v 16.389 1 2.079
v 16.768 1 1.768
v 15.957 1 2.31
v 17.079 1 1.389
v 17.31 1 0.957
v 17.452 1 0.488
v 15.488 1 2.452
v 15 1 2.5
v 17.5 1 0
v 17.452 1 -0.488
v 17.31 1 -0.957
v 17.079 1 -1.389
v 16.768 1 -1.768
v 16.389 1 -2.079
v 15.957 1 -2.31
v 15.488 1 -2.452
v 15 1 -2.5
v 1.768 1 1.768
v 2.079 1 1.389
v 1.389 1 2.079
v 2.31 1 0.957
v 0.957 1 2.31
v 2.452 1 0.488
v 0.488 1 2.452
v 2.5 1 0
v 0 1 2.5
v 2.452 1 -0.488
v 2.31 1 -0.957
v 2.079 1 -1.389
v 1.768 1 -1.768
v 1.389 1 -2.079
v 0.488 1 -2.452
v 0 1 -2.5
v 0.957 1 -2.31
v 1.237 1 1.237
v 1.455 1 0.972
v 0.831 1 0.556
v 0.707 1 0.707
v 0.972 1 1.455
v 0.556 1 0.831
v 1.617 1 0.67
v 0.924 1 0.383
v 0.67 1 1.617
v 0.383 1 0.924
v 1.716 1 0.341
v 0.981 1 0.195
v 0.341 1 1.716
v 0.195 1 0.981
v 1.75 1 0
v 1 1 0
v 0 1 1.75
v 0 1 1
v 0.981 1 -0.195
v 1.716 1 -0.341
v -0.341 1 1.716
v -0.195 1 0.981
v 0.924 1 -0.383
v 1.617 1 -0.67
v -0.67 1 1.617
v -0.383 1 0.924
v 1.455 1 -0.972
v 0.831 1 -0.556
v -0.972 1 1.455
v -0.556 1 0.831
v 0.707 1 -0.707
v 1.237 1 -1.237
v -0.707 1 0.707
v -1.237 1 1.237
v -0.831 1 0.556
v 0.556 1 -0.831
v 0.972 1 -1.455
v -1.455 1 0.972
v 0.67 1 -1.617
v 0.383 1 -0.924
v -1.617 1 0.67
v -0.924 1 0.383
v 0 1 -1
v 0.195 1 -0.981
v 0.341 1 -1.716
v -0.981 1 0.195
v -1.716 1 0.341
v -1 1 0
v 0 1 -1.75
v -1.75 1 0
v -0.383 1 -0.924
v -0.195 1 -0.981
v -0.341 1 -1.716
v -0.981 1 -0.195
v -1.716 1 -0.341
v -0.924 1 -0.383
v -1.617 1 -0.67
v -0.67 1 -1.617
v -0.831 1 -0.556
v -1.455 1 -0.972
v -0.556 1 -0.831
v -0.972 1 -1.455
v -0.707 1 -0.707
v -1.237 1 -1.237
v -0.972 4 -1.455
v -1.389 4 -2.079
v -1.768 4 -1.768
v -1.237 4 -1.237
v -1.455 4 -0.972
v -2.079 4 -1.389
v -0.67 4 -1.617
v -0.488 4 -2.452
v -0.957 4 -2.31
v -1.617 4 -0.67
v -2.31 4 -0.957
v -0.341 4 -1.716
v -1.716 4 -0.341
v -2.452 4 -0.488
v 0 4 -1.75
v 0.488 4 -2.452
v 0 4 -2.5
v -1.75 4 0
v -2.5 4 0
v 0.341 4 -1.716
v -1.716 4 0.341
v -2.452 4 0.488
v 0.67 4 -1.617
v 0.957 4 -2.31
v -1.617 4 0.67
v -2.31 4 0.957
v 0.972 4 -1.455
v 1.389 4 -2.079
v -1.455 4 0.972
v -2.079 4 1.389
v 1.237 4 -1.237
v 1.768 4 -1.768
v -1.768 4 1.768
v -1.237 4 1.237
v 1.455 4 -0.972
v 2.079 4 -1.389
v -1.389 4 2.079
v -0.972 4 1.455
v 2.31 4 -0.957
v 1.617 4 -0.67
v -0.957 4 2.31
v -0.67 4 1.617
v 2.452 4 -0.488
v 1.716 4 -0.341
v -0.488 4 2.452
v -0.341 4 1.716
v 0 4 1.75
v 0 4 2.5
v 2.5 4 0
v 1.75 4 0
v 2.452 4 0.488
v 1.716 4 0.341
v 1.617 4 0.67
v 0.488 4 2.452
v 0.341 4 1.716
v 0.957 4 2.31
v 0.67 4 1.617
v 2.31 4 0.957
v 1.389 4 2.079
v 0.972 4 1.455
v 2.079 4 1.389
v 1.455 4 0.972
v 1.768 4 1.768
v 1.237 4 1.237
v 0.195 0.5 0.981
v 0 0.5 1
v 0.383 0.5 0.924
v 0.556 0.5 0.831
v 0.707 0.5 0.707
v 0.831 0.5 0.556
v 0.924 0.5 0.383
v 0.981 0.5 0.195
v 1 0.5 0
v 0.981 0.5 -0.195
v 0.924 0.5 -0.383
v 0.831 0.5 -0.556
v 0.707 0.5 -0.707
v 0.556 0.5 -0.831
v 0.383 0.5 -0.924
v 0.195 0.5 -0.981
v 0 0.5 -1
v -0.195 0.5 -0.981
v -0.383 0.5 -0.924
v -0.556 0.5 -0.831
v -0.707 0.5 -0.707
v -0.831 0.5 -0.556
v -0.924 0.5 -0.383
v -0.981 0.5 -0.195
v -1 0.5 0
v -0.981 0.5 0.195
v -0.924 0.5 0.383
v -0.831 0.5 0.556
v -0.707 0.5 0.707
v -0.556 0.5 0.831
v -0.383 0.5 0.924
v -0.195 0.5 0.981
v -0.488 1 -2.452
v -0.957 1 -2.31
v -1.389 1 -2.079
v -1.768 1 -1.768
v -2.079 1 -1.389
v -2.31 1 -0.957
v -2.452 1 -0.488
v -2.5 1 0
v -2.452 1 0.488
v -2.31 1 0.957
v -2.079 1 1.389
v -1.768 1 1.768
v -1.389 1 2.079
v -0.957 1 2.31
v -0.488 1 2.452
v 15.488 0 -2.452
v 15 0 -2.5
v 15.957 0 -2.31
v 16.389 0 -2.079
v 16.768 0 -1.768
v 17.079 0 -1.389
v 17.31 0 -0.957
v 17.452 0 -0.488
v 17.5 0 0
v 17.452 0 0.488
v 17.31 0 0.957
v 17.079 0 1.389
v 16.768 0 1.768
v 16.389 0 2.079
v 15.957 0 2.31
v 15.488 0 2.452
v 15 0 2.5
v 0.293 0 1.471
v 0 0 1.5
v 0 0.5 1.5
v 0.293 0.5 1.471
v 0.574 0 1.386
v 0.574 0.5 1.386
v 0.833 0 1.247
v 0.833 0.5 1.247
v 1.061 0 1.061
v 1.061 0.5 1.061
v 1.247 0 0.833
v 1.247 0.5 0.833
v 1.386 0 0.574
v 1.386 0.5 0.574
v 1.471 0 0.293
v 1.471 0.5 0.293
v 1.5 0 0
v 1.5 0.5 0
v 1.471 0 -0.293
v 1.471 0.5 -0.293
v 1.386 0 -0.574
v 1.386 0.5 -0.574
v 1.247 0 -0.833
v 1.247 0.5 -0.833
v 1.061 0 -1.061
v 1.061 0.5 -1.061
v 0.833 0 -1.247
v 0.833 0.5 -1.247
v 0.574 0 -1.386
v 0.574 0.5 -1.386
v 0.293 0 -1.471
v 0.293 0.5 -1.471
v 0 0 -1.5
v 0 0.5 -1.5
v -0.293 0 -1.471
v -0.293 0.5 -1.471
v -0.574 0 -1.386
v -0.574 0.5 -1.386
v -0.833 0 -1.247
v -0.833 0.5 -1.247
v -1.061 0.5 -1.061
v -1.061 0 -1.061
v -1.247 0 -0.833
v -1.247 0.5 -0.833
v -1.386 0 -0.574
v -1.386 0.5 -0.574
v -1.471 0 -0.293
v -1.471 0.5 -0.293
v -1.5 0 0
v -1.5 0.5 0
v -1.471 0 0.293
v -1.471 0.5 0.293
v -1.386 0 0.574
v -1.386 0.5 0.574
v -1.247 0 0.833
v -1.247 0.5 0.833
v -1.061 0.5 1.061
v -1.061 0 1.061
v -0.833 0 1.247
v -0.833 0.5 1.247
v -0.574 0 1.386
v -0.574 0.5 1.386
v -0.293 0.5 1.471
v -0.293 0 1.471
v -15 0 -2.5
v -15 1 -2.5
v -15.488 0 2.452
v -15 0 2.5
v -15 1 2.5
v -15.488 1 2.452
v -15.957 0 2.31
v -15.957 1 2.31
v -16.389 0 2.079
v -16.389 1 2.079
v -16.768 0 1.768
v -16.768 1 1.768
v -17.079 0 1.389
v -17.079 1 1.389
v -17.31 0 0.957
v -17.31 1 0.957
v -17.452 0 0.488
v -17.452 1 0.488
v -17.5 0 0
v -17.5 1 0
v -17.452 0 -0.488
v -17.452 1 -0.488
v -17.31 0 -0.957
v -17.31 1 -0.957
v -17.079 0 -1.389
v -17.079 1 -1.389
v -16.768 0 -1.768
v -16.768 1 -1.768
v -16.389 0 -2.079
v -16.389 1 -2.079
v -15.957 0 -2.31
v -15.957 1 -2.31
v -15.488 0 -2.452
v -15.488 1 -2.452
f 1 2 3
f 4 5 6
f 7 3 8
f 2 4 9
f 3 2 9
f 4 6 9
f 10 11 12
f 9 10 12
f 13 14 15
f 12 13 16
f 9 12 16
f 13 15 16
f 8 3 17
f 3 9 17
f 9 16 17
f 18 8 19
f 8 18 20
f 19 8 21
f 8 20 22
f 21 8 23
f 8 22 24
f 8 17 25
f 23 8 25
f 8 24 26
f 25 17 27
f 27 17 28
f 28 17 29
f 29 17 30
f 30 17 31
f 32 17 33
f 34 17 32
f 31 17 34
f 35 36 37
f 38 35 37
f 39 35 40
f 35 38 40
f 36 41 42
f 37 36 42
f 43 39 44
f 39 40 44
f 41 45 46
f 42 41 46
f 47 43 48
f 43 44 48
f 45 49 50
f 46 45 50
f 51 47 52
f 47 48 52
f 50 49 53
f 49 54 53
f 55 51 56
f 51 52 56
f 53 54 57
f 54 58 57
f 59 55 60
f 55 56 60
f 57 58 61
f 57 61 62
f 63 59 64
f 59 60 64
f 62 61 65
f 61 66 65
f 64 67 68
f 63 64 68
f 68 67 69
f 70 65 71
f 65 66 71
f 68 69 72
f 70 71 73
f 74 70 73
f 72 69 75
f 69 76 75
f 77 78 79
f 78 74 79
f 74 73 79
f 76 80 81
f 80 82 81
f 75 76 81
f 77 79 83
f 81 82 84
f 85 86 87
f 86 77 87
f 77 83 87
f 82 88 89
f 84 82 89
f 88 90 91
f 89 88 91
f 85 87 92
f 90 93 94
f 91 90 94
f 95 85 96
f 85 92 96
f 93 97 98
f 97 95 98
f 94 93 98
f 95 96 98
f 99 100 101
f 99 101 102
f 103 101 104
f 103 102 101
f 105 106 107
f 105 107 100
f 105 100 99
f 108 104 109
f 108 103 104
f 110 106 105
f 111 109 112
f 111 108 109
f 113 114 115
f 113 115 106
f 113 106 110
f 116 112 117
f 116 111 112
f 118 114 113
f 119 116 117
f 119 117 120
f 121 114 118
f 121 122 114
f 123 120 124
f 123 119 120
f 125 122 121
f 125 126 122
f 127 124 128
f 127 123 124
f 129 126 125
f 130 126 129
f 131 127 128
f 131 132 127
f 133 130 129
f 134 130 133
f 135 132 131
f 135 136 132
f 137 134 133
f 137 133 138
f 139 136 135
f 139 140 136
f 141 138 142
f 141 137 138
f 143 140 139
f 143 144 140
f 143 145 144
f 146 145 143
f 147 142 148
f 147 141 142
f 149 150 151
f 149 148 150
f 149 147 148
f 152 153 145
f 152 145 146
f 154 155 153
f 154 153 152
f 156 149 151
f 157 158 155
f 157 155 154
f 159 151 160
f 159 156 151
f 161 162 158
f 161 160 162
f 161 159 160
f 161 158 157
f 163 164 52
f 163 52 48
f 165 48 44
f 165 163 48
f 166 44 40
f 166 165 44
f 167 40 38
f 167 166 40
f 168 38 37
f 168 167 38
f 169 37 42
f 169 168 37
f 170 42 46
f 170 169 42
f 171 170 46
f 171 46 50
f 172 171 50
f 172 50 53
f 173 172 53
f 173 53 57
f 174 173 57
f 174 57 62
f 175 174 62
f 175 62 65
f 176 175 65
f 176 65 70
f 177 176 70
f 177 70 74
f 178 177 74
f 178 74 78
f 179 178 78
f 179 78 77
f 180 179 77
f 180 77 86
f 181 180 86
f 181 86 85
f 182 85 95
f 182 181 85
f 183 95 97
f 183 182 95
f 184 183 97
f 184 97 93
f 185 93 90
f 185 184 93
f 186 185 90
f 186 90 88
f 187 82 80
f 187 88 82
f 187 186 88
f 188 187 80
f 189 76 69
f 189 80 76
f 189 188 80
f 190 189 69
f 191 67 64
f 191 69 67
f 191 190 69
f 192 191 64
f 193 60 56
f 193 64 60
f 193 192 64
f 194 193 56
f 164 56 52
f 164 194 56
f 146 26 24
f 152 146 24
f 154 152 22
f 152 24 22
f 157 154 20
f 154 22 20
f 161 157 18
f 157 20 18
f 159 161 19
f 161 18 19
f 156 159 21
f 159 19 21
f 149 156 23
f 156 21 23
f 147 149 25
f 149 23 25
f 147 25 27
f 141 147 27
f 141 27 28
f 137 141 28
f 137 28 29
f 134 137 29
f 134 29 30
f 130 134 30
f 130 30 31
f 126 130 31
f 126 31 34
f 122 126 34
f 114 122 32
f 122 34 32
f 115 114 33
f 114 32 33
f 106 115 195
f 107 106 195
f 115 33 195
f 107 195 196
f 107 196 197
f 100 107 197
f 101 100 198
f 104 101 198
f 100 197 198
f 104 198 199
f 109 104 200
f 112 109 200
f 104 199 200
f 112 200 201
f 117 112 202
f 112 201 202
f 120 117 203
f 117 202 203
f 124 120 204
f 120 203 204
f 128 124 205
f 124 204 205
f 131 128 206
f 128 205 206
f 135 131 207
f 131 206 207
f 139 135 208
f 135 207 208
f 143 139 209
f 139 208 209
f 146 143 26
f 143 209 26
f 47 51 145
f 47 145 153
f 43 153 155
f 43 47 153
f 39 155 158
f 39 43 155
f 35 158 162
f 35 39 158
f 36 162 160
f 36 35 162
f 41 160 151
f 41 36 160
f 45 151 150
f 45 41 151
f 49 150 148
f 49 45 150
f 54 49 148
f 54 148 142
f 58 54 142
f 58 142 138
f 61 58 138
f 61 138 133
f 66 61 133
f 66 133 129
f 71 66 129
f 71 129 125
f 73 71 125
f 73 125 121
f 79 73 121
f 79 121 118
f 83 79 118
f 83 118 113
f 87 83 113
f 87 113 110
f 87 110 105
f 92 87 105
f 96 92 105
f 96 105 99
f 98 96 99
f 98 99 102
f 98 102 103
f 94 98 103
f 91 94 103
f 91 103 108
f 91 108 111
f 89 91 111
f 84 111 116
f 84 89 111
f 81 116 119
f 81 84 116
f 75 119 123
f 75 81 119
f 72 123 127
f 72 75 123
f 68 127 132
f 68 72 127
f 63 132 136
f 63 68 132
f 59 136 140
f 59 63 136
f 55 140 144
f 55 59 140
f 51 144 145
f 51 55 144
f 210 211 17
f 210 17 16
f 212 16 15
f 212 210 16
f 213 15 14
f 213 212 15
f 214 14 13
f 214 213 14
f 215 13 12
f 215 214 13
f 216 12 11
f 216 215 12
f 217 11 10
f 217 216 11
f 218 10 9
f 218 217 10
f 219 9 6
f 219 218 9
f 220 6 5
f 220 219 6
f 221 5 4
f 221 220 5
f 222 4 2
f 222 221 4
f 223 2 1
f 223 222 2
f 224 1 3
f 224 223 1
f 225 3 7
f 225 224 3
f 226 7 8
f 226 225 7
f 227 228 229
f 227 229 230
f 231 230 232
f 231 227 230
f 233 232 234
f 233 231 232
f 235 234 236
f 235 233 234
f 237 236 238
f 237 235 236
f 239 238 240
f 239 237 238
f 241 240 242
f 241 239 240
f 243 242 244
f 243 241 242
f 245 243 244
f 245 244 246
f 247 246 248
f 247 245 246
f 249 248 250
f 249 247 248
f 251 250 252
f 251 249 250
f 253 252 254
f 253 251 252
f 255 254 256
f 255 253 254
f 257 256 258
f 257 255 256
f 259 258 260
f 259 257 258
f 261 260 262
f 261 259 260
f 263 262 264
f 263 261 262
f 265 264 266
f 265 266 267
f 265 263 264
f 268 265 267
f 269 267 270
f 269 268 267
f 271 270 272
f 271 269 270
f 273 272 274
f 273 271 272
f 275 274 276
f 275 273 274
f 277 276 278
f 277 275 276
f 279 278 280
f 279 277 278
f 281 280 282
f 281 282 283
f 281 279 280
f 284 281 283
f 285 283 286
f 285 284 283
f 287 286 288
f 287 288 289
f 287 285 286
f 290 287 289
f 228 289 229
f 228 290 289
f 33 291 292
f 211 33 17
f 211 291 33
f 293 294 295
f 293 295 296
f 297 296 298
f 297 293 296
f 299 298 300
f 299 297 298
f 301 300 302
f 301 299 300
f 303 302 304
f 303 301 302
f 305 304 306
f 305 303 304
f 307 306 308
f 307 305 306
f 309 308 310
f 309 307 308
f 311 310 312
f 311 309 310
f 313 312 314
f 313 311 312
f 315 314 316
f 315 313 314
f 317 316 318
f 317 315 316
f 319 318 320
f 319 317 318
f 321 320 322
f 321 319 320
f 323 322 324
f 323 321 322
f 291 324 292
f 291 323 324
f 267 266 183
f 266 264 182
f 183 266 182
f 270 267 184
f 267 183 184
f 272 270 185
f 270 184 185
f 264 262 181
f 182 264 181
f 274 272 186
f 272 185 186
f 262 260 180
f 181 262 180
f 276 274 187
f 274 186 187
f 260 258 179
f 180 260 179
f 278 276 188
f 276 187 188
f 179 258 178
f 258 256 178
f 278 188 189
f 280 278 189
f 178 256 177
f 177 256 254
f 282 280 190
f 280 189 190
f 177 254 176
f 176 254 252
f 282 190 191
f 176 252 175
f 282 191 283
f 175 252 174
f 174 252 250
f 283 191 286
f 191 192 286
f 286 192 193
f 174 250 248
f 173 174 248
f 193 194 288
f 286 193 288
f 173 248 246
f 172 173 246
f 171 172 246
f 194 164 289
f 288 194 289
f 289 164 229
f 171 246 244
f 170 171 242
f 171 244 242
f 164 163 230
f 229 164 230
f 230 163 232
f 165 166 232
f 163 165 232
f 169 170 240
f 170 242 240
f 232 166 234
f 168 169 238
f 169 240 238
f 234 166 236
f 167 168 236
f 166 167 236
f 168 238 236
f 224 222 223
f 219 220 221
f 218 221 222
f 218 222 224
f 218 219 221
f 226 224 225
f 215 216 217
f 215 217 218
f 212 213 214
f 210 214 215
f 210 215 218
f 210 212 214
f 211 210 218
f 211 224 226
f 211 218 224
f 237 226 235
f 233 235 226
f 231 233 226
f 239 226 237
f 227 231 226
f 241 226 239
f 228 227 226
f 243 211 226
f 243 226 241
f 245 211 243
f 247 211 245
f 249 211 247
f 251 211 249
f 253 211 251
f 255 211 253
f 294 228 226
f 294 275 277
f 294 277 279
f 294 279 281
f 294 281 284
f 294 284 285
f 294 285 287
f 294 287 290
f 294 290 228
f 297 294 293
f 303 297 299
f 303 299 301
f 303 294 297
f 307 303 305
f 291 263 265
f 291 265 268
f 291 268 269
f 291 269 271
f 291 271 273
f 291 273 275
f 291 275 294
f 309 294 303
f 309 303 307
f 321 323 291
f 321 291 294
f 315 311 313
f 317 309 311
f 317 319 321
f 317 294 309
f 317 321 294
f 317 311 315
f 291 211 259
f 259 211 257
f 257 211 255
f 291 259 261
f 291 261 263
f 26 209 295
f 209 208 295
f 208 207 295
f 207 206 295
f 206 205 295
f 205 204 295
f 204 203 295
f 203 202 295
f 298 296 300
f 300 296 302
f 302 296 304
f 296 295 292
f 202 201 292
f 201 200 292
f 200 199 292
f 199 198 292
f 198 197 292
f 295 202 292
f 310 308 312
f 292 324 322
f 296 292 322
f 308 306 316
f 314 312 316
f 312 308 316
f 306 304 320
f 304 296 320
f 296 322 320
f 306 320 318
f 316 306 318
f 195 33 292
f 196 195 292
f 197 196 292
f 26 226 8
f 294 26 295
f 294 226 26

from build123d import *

# Parameters (mm, degrees)
EXTRUDE_1_DEPTH     = 1
SKETCH_2_R          = 2.5
SKETCH_2_R_2        = 1.75
EXTRUDE_2_DEPTH     = 4
SKETCH_3_R          = 1
CUT_EXTRUDE_1_DEPTH = 4
SKETCH_4_R          = 1.5
CUT_EXTRUDE_2_DEPTH = 0.5


with BuildPart() as part:
    # 草图1 → 凸台-拉伸1 (new body)
    with BuildSketch(Plane(origin=(0, 0, 0), x_dir=(1, 0, 0), z_dir=(0, 1, 0))):
        with BuildLine():
            Line((-15, 2.5), (15, 2.5))
            ThreePointArc((15, 2.5), (17.5, 0), (15, -2.5))
            Line((15, -2.5), (-15, -2.5))
            ThreePointArc((-15, -2.5), (-17.5, 0), (-15, 2.5))
        make_face()
    extrude(amount=EXTRUDE_1_DEPTH)

    # 草图2 → 凸台-拉伸2 (add)
    with BuildSketch(Plane(origin=(0, 0, 0), x_dir=(1, 0, 0), z_dir=(0, 1, 0))):
        with Locations(Location((0, 0, 0), (0, 0, 270))):
            Circle(SKETCH_2_R)
        with Locations(Location((0, 0, 0), (0, 0, 270))):
            Circle(SKETCH_2_R_2, mode=Mode.SUBTRACT)
    extrude(amount=EXTRUDE_2_DEPTH)

    # 草图3 → 切除-拉伸1 (cut)
    with BuildSketch(Plane(origin=(0, 0, 0), x_dir=(1, 0, 0), z_dir=(0, 1, 0))):
        with Locations(Location((0, 0, 0), (0, 0, 270))):
            Circle(SKETCH_3_R)
    extrude(amount=CUT_EXTRUDE_1_DEPTH, mode=Mode.SUBTRACT)

    # 草图4 → 切除-拉伸2 (cut)
    with BuildSketch(Plane(origin=(0, 0, 0), x_dir=(1, 0, 0), z_dir=(0, 1, 0))):
        with Locations(Location((0, 0, 0), (0, 0, 270))):
            Circle(SKETCH_4_R)
    extrude(amount=CUT_EXTRUDE_2_DEPTH, mode=Mode.SUBTRACT)


solid = part.part
